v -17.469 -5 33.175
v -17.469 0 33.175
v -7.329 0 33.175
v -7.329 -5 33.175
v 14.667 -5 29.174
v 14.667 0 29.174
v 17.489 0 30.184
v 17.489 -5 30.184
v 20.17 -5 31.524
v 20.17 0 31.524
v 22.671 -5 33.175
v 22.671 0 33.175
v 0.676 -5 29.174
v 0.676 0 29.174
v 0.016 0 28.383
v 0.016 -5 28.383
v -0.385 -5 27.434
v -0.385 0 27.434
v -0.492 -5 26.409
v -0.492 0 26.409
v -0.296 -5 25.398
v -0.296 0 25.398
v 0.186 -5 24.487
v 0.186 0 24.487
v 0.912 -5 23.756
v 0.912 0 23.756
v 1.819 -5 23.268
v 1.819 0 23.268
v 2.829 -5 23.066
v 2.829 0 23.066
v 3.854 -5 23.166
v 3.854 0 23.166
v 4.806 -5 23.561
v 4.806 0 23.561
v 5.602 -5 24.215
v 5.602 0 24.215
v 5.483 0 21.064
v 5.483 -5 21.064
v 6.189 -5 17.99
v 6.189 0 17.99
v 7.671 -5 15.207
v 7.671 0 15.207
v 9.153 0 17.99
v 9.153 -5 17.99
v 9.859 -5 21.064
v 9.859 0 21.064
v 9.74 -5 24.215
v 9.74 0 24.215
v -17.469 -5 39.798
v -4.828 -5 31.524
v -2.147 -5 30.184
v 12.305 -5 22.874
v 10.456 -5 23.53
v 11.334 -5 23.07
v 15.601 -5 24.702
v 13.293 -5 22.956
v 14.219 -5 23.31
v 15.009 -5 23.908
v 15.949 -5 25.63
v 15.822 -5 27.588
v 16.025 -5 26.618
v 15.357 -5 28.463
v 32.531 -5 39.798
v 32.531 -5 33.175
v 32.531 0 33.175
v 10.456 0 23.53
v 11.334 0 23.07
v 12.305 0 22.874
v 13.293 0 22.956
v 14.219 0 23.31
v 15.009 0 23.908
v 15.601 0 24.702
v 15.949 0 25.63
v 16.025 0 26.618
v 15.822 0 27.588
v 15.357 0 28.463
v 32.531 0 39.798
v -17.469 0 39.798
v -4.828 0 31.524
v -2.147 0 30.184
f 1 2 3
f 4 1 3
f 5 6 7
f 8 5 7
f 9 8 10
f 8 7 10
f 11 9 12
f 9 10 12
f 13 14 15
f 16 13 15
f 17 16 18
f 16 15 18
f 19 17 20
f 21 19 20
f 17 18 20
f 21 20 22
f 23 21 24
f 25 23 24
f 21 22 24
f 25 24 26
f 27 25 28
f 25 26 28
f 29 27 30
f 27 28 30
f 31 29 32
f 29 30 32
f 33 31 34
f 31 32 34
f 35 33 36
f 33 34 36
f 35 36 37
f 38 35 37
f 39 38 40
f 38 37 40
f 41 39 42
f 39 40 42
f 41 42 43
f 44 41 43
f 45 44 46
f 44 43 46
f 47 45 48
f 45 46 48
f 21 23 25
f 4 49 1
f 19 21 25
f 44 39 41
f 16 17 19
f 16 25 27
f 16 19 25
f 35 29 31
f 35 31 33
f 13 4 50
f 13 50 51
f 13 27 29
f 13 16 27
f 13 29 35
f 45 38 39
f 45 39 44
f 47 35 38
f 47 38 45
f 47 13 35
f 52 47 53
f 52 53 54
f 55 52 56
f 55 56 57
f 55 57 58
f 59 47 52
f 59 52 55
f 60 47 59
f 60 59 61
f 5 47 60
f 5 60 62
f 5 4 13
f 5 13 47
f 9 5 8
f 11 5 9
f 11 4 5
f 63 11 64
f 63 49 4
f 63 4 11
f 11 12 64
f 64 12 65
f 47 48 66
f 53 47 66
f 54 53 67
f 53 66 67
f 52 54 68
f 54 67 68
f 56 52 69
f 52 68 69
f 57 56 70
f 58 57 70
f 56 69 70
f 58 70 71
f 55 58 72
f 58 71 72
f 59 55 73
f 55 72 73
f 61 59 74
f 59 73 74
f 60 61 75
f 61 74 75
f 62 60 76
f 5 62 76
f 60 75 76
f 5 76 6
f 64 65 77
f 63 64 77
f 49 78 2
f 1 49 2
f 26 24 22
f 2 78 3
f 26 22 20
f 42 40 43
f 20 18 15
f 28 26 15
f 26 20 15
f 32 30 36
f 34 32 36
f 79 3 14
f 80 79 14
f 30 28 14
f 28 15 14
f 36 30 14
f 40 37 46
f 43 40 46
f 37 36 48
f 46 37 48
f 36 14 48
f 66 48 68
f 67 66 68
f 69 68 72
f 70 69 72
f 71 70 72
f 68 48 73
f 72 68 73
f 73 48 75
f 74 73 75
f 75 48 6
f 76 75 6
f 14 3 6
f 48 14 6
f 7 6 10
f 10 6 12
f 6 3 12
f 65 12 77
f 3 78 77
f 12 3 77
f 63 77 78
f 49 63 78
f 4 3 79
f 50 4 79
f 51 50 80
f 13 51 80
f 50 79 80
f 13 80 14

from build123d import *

# Parameters (mm, degrees)
F1_DEPTH = 5


# Not quite as in the source:
# - a feature of the source that left no trace in its solid (it failed there, or was rolled back) is left out


with BuildPart() as f1:
    # F0 (on Front) → F1 (new body)
    with BuildSketch(Plane.XZ):
        Polygon((32.530919835, 39.797769749), (-17.469080165, 39.797769749), (-17.469080165, 33.1753157079), (-7.3289242573, 33.1753157079), (22.6710757427, 33.1753157079), (32.530919835, 33.1753157079), align=None)
        with BuildLine():
            Line((22.6710757427, 33.1753157079), (-7.3289242573, 33.1753157079))
            ThreePointArc((-7.3289242573, 33.1753157079), (-3.5071800034, 30.8135939836), (0.6755496306, 29.1740112764))
            Line((0.6755496306, 29.1740112764), (7.6710757427, 29.1740112764))
            Line((7.6710757427, 29.1740112764), (14.6666018548, 29.1740112764))
            ThreePointArc((14.6666018548, 29.1740112764), (18.8493314888, 30.8135939836), (22.6710757427, 33.1753157079))
        make_face()
        with BuildLine():
            Line((7.6710757427, 29.1740112764), (0.6755496306, 29.1740112764))
            ThreePointArc((0.6755496306, 29.1740112764), (0.5215760436, 24.0947560366), (5.6017371537, 24.215191712))
            ThreePointArc((5.6017371537, 24.215191712), (6.355285365, 26.8119146366), (7.6710757427, 29.1740112764))
        make_face()
        with BuildLine():
            ThreePointArc((9.7404143316, 24.215191712), (15.0089010531, 23.907669722), (14.6666018548, 29.1740112764))
            Line((14.6666018548, 29.1740112764), (7.6710757427, 29.1740112764))
            ThreePointArc((7.6710757427, 29.1740112764), (8.9868661204, 26.8119146366), (9.7404143316, 24.215191712))
        make_face()
        with BuildLine():
            ThreePointArc((9.7404143316, 24.215191712), (8.9868661204, 26.8119146366), (7.6710757427, 29.1740112764))
            ThreePointArc((7.6710757427, 29.1740112764), (6.355285365, 26.8119146366), (5.6017371537, 24.215191712))
            ThreePointArc((5.6017371537, 24.215191712), (5.7343151874, 19.5038742549), (7.6710757427, 15.20700939))
            ThreePointArc((7.6710757427, 15.20700939), (9.607836298, 19.5038742549), (9.7404143316, 24.215191712))
        make_face()
    extrude(amount=F1_DEPTH)


solid = f1.part
